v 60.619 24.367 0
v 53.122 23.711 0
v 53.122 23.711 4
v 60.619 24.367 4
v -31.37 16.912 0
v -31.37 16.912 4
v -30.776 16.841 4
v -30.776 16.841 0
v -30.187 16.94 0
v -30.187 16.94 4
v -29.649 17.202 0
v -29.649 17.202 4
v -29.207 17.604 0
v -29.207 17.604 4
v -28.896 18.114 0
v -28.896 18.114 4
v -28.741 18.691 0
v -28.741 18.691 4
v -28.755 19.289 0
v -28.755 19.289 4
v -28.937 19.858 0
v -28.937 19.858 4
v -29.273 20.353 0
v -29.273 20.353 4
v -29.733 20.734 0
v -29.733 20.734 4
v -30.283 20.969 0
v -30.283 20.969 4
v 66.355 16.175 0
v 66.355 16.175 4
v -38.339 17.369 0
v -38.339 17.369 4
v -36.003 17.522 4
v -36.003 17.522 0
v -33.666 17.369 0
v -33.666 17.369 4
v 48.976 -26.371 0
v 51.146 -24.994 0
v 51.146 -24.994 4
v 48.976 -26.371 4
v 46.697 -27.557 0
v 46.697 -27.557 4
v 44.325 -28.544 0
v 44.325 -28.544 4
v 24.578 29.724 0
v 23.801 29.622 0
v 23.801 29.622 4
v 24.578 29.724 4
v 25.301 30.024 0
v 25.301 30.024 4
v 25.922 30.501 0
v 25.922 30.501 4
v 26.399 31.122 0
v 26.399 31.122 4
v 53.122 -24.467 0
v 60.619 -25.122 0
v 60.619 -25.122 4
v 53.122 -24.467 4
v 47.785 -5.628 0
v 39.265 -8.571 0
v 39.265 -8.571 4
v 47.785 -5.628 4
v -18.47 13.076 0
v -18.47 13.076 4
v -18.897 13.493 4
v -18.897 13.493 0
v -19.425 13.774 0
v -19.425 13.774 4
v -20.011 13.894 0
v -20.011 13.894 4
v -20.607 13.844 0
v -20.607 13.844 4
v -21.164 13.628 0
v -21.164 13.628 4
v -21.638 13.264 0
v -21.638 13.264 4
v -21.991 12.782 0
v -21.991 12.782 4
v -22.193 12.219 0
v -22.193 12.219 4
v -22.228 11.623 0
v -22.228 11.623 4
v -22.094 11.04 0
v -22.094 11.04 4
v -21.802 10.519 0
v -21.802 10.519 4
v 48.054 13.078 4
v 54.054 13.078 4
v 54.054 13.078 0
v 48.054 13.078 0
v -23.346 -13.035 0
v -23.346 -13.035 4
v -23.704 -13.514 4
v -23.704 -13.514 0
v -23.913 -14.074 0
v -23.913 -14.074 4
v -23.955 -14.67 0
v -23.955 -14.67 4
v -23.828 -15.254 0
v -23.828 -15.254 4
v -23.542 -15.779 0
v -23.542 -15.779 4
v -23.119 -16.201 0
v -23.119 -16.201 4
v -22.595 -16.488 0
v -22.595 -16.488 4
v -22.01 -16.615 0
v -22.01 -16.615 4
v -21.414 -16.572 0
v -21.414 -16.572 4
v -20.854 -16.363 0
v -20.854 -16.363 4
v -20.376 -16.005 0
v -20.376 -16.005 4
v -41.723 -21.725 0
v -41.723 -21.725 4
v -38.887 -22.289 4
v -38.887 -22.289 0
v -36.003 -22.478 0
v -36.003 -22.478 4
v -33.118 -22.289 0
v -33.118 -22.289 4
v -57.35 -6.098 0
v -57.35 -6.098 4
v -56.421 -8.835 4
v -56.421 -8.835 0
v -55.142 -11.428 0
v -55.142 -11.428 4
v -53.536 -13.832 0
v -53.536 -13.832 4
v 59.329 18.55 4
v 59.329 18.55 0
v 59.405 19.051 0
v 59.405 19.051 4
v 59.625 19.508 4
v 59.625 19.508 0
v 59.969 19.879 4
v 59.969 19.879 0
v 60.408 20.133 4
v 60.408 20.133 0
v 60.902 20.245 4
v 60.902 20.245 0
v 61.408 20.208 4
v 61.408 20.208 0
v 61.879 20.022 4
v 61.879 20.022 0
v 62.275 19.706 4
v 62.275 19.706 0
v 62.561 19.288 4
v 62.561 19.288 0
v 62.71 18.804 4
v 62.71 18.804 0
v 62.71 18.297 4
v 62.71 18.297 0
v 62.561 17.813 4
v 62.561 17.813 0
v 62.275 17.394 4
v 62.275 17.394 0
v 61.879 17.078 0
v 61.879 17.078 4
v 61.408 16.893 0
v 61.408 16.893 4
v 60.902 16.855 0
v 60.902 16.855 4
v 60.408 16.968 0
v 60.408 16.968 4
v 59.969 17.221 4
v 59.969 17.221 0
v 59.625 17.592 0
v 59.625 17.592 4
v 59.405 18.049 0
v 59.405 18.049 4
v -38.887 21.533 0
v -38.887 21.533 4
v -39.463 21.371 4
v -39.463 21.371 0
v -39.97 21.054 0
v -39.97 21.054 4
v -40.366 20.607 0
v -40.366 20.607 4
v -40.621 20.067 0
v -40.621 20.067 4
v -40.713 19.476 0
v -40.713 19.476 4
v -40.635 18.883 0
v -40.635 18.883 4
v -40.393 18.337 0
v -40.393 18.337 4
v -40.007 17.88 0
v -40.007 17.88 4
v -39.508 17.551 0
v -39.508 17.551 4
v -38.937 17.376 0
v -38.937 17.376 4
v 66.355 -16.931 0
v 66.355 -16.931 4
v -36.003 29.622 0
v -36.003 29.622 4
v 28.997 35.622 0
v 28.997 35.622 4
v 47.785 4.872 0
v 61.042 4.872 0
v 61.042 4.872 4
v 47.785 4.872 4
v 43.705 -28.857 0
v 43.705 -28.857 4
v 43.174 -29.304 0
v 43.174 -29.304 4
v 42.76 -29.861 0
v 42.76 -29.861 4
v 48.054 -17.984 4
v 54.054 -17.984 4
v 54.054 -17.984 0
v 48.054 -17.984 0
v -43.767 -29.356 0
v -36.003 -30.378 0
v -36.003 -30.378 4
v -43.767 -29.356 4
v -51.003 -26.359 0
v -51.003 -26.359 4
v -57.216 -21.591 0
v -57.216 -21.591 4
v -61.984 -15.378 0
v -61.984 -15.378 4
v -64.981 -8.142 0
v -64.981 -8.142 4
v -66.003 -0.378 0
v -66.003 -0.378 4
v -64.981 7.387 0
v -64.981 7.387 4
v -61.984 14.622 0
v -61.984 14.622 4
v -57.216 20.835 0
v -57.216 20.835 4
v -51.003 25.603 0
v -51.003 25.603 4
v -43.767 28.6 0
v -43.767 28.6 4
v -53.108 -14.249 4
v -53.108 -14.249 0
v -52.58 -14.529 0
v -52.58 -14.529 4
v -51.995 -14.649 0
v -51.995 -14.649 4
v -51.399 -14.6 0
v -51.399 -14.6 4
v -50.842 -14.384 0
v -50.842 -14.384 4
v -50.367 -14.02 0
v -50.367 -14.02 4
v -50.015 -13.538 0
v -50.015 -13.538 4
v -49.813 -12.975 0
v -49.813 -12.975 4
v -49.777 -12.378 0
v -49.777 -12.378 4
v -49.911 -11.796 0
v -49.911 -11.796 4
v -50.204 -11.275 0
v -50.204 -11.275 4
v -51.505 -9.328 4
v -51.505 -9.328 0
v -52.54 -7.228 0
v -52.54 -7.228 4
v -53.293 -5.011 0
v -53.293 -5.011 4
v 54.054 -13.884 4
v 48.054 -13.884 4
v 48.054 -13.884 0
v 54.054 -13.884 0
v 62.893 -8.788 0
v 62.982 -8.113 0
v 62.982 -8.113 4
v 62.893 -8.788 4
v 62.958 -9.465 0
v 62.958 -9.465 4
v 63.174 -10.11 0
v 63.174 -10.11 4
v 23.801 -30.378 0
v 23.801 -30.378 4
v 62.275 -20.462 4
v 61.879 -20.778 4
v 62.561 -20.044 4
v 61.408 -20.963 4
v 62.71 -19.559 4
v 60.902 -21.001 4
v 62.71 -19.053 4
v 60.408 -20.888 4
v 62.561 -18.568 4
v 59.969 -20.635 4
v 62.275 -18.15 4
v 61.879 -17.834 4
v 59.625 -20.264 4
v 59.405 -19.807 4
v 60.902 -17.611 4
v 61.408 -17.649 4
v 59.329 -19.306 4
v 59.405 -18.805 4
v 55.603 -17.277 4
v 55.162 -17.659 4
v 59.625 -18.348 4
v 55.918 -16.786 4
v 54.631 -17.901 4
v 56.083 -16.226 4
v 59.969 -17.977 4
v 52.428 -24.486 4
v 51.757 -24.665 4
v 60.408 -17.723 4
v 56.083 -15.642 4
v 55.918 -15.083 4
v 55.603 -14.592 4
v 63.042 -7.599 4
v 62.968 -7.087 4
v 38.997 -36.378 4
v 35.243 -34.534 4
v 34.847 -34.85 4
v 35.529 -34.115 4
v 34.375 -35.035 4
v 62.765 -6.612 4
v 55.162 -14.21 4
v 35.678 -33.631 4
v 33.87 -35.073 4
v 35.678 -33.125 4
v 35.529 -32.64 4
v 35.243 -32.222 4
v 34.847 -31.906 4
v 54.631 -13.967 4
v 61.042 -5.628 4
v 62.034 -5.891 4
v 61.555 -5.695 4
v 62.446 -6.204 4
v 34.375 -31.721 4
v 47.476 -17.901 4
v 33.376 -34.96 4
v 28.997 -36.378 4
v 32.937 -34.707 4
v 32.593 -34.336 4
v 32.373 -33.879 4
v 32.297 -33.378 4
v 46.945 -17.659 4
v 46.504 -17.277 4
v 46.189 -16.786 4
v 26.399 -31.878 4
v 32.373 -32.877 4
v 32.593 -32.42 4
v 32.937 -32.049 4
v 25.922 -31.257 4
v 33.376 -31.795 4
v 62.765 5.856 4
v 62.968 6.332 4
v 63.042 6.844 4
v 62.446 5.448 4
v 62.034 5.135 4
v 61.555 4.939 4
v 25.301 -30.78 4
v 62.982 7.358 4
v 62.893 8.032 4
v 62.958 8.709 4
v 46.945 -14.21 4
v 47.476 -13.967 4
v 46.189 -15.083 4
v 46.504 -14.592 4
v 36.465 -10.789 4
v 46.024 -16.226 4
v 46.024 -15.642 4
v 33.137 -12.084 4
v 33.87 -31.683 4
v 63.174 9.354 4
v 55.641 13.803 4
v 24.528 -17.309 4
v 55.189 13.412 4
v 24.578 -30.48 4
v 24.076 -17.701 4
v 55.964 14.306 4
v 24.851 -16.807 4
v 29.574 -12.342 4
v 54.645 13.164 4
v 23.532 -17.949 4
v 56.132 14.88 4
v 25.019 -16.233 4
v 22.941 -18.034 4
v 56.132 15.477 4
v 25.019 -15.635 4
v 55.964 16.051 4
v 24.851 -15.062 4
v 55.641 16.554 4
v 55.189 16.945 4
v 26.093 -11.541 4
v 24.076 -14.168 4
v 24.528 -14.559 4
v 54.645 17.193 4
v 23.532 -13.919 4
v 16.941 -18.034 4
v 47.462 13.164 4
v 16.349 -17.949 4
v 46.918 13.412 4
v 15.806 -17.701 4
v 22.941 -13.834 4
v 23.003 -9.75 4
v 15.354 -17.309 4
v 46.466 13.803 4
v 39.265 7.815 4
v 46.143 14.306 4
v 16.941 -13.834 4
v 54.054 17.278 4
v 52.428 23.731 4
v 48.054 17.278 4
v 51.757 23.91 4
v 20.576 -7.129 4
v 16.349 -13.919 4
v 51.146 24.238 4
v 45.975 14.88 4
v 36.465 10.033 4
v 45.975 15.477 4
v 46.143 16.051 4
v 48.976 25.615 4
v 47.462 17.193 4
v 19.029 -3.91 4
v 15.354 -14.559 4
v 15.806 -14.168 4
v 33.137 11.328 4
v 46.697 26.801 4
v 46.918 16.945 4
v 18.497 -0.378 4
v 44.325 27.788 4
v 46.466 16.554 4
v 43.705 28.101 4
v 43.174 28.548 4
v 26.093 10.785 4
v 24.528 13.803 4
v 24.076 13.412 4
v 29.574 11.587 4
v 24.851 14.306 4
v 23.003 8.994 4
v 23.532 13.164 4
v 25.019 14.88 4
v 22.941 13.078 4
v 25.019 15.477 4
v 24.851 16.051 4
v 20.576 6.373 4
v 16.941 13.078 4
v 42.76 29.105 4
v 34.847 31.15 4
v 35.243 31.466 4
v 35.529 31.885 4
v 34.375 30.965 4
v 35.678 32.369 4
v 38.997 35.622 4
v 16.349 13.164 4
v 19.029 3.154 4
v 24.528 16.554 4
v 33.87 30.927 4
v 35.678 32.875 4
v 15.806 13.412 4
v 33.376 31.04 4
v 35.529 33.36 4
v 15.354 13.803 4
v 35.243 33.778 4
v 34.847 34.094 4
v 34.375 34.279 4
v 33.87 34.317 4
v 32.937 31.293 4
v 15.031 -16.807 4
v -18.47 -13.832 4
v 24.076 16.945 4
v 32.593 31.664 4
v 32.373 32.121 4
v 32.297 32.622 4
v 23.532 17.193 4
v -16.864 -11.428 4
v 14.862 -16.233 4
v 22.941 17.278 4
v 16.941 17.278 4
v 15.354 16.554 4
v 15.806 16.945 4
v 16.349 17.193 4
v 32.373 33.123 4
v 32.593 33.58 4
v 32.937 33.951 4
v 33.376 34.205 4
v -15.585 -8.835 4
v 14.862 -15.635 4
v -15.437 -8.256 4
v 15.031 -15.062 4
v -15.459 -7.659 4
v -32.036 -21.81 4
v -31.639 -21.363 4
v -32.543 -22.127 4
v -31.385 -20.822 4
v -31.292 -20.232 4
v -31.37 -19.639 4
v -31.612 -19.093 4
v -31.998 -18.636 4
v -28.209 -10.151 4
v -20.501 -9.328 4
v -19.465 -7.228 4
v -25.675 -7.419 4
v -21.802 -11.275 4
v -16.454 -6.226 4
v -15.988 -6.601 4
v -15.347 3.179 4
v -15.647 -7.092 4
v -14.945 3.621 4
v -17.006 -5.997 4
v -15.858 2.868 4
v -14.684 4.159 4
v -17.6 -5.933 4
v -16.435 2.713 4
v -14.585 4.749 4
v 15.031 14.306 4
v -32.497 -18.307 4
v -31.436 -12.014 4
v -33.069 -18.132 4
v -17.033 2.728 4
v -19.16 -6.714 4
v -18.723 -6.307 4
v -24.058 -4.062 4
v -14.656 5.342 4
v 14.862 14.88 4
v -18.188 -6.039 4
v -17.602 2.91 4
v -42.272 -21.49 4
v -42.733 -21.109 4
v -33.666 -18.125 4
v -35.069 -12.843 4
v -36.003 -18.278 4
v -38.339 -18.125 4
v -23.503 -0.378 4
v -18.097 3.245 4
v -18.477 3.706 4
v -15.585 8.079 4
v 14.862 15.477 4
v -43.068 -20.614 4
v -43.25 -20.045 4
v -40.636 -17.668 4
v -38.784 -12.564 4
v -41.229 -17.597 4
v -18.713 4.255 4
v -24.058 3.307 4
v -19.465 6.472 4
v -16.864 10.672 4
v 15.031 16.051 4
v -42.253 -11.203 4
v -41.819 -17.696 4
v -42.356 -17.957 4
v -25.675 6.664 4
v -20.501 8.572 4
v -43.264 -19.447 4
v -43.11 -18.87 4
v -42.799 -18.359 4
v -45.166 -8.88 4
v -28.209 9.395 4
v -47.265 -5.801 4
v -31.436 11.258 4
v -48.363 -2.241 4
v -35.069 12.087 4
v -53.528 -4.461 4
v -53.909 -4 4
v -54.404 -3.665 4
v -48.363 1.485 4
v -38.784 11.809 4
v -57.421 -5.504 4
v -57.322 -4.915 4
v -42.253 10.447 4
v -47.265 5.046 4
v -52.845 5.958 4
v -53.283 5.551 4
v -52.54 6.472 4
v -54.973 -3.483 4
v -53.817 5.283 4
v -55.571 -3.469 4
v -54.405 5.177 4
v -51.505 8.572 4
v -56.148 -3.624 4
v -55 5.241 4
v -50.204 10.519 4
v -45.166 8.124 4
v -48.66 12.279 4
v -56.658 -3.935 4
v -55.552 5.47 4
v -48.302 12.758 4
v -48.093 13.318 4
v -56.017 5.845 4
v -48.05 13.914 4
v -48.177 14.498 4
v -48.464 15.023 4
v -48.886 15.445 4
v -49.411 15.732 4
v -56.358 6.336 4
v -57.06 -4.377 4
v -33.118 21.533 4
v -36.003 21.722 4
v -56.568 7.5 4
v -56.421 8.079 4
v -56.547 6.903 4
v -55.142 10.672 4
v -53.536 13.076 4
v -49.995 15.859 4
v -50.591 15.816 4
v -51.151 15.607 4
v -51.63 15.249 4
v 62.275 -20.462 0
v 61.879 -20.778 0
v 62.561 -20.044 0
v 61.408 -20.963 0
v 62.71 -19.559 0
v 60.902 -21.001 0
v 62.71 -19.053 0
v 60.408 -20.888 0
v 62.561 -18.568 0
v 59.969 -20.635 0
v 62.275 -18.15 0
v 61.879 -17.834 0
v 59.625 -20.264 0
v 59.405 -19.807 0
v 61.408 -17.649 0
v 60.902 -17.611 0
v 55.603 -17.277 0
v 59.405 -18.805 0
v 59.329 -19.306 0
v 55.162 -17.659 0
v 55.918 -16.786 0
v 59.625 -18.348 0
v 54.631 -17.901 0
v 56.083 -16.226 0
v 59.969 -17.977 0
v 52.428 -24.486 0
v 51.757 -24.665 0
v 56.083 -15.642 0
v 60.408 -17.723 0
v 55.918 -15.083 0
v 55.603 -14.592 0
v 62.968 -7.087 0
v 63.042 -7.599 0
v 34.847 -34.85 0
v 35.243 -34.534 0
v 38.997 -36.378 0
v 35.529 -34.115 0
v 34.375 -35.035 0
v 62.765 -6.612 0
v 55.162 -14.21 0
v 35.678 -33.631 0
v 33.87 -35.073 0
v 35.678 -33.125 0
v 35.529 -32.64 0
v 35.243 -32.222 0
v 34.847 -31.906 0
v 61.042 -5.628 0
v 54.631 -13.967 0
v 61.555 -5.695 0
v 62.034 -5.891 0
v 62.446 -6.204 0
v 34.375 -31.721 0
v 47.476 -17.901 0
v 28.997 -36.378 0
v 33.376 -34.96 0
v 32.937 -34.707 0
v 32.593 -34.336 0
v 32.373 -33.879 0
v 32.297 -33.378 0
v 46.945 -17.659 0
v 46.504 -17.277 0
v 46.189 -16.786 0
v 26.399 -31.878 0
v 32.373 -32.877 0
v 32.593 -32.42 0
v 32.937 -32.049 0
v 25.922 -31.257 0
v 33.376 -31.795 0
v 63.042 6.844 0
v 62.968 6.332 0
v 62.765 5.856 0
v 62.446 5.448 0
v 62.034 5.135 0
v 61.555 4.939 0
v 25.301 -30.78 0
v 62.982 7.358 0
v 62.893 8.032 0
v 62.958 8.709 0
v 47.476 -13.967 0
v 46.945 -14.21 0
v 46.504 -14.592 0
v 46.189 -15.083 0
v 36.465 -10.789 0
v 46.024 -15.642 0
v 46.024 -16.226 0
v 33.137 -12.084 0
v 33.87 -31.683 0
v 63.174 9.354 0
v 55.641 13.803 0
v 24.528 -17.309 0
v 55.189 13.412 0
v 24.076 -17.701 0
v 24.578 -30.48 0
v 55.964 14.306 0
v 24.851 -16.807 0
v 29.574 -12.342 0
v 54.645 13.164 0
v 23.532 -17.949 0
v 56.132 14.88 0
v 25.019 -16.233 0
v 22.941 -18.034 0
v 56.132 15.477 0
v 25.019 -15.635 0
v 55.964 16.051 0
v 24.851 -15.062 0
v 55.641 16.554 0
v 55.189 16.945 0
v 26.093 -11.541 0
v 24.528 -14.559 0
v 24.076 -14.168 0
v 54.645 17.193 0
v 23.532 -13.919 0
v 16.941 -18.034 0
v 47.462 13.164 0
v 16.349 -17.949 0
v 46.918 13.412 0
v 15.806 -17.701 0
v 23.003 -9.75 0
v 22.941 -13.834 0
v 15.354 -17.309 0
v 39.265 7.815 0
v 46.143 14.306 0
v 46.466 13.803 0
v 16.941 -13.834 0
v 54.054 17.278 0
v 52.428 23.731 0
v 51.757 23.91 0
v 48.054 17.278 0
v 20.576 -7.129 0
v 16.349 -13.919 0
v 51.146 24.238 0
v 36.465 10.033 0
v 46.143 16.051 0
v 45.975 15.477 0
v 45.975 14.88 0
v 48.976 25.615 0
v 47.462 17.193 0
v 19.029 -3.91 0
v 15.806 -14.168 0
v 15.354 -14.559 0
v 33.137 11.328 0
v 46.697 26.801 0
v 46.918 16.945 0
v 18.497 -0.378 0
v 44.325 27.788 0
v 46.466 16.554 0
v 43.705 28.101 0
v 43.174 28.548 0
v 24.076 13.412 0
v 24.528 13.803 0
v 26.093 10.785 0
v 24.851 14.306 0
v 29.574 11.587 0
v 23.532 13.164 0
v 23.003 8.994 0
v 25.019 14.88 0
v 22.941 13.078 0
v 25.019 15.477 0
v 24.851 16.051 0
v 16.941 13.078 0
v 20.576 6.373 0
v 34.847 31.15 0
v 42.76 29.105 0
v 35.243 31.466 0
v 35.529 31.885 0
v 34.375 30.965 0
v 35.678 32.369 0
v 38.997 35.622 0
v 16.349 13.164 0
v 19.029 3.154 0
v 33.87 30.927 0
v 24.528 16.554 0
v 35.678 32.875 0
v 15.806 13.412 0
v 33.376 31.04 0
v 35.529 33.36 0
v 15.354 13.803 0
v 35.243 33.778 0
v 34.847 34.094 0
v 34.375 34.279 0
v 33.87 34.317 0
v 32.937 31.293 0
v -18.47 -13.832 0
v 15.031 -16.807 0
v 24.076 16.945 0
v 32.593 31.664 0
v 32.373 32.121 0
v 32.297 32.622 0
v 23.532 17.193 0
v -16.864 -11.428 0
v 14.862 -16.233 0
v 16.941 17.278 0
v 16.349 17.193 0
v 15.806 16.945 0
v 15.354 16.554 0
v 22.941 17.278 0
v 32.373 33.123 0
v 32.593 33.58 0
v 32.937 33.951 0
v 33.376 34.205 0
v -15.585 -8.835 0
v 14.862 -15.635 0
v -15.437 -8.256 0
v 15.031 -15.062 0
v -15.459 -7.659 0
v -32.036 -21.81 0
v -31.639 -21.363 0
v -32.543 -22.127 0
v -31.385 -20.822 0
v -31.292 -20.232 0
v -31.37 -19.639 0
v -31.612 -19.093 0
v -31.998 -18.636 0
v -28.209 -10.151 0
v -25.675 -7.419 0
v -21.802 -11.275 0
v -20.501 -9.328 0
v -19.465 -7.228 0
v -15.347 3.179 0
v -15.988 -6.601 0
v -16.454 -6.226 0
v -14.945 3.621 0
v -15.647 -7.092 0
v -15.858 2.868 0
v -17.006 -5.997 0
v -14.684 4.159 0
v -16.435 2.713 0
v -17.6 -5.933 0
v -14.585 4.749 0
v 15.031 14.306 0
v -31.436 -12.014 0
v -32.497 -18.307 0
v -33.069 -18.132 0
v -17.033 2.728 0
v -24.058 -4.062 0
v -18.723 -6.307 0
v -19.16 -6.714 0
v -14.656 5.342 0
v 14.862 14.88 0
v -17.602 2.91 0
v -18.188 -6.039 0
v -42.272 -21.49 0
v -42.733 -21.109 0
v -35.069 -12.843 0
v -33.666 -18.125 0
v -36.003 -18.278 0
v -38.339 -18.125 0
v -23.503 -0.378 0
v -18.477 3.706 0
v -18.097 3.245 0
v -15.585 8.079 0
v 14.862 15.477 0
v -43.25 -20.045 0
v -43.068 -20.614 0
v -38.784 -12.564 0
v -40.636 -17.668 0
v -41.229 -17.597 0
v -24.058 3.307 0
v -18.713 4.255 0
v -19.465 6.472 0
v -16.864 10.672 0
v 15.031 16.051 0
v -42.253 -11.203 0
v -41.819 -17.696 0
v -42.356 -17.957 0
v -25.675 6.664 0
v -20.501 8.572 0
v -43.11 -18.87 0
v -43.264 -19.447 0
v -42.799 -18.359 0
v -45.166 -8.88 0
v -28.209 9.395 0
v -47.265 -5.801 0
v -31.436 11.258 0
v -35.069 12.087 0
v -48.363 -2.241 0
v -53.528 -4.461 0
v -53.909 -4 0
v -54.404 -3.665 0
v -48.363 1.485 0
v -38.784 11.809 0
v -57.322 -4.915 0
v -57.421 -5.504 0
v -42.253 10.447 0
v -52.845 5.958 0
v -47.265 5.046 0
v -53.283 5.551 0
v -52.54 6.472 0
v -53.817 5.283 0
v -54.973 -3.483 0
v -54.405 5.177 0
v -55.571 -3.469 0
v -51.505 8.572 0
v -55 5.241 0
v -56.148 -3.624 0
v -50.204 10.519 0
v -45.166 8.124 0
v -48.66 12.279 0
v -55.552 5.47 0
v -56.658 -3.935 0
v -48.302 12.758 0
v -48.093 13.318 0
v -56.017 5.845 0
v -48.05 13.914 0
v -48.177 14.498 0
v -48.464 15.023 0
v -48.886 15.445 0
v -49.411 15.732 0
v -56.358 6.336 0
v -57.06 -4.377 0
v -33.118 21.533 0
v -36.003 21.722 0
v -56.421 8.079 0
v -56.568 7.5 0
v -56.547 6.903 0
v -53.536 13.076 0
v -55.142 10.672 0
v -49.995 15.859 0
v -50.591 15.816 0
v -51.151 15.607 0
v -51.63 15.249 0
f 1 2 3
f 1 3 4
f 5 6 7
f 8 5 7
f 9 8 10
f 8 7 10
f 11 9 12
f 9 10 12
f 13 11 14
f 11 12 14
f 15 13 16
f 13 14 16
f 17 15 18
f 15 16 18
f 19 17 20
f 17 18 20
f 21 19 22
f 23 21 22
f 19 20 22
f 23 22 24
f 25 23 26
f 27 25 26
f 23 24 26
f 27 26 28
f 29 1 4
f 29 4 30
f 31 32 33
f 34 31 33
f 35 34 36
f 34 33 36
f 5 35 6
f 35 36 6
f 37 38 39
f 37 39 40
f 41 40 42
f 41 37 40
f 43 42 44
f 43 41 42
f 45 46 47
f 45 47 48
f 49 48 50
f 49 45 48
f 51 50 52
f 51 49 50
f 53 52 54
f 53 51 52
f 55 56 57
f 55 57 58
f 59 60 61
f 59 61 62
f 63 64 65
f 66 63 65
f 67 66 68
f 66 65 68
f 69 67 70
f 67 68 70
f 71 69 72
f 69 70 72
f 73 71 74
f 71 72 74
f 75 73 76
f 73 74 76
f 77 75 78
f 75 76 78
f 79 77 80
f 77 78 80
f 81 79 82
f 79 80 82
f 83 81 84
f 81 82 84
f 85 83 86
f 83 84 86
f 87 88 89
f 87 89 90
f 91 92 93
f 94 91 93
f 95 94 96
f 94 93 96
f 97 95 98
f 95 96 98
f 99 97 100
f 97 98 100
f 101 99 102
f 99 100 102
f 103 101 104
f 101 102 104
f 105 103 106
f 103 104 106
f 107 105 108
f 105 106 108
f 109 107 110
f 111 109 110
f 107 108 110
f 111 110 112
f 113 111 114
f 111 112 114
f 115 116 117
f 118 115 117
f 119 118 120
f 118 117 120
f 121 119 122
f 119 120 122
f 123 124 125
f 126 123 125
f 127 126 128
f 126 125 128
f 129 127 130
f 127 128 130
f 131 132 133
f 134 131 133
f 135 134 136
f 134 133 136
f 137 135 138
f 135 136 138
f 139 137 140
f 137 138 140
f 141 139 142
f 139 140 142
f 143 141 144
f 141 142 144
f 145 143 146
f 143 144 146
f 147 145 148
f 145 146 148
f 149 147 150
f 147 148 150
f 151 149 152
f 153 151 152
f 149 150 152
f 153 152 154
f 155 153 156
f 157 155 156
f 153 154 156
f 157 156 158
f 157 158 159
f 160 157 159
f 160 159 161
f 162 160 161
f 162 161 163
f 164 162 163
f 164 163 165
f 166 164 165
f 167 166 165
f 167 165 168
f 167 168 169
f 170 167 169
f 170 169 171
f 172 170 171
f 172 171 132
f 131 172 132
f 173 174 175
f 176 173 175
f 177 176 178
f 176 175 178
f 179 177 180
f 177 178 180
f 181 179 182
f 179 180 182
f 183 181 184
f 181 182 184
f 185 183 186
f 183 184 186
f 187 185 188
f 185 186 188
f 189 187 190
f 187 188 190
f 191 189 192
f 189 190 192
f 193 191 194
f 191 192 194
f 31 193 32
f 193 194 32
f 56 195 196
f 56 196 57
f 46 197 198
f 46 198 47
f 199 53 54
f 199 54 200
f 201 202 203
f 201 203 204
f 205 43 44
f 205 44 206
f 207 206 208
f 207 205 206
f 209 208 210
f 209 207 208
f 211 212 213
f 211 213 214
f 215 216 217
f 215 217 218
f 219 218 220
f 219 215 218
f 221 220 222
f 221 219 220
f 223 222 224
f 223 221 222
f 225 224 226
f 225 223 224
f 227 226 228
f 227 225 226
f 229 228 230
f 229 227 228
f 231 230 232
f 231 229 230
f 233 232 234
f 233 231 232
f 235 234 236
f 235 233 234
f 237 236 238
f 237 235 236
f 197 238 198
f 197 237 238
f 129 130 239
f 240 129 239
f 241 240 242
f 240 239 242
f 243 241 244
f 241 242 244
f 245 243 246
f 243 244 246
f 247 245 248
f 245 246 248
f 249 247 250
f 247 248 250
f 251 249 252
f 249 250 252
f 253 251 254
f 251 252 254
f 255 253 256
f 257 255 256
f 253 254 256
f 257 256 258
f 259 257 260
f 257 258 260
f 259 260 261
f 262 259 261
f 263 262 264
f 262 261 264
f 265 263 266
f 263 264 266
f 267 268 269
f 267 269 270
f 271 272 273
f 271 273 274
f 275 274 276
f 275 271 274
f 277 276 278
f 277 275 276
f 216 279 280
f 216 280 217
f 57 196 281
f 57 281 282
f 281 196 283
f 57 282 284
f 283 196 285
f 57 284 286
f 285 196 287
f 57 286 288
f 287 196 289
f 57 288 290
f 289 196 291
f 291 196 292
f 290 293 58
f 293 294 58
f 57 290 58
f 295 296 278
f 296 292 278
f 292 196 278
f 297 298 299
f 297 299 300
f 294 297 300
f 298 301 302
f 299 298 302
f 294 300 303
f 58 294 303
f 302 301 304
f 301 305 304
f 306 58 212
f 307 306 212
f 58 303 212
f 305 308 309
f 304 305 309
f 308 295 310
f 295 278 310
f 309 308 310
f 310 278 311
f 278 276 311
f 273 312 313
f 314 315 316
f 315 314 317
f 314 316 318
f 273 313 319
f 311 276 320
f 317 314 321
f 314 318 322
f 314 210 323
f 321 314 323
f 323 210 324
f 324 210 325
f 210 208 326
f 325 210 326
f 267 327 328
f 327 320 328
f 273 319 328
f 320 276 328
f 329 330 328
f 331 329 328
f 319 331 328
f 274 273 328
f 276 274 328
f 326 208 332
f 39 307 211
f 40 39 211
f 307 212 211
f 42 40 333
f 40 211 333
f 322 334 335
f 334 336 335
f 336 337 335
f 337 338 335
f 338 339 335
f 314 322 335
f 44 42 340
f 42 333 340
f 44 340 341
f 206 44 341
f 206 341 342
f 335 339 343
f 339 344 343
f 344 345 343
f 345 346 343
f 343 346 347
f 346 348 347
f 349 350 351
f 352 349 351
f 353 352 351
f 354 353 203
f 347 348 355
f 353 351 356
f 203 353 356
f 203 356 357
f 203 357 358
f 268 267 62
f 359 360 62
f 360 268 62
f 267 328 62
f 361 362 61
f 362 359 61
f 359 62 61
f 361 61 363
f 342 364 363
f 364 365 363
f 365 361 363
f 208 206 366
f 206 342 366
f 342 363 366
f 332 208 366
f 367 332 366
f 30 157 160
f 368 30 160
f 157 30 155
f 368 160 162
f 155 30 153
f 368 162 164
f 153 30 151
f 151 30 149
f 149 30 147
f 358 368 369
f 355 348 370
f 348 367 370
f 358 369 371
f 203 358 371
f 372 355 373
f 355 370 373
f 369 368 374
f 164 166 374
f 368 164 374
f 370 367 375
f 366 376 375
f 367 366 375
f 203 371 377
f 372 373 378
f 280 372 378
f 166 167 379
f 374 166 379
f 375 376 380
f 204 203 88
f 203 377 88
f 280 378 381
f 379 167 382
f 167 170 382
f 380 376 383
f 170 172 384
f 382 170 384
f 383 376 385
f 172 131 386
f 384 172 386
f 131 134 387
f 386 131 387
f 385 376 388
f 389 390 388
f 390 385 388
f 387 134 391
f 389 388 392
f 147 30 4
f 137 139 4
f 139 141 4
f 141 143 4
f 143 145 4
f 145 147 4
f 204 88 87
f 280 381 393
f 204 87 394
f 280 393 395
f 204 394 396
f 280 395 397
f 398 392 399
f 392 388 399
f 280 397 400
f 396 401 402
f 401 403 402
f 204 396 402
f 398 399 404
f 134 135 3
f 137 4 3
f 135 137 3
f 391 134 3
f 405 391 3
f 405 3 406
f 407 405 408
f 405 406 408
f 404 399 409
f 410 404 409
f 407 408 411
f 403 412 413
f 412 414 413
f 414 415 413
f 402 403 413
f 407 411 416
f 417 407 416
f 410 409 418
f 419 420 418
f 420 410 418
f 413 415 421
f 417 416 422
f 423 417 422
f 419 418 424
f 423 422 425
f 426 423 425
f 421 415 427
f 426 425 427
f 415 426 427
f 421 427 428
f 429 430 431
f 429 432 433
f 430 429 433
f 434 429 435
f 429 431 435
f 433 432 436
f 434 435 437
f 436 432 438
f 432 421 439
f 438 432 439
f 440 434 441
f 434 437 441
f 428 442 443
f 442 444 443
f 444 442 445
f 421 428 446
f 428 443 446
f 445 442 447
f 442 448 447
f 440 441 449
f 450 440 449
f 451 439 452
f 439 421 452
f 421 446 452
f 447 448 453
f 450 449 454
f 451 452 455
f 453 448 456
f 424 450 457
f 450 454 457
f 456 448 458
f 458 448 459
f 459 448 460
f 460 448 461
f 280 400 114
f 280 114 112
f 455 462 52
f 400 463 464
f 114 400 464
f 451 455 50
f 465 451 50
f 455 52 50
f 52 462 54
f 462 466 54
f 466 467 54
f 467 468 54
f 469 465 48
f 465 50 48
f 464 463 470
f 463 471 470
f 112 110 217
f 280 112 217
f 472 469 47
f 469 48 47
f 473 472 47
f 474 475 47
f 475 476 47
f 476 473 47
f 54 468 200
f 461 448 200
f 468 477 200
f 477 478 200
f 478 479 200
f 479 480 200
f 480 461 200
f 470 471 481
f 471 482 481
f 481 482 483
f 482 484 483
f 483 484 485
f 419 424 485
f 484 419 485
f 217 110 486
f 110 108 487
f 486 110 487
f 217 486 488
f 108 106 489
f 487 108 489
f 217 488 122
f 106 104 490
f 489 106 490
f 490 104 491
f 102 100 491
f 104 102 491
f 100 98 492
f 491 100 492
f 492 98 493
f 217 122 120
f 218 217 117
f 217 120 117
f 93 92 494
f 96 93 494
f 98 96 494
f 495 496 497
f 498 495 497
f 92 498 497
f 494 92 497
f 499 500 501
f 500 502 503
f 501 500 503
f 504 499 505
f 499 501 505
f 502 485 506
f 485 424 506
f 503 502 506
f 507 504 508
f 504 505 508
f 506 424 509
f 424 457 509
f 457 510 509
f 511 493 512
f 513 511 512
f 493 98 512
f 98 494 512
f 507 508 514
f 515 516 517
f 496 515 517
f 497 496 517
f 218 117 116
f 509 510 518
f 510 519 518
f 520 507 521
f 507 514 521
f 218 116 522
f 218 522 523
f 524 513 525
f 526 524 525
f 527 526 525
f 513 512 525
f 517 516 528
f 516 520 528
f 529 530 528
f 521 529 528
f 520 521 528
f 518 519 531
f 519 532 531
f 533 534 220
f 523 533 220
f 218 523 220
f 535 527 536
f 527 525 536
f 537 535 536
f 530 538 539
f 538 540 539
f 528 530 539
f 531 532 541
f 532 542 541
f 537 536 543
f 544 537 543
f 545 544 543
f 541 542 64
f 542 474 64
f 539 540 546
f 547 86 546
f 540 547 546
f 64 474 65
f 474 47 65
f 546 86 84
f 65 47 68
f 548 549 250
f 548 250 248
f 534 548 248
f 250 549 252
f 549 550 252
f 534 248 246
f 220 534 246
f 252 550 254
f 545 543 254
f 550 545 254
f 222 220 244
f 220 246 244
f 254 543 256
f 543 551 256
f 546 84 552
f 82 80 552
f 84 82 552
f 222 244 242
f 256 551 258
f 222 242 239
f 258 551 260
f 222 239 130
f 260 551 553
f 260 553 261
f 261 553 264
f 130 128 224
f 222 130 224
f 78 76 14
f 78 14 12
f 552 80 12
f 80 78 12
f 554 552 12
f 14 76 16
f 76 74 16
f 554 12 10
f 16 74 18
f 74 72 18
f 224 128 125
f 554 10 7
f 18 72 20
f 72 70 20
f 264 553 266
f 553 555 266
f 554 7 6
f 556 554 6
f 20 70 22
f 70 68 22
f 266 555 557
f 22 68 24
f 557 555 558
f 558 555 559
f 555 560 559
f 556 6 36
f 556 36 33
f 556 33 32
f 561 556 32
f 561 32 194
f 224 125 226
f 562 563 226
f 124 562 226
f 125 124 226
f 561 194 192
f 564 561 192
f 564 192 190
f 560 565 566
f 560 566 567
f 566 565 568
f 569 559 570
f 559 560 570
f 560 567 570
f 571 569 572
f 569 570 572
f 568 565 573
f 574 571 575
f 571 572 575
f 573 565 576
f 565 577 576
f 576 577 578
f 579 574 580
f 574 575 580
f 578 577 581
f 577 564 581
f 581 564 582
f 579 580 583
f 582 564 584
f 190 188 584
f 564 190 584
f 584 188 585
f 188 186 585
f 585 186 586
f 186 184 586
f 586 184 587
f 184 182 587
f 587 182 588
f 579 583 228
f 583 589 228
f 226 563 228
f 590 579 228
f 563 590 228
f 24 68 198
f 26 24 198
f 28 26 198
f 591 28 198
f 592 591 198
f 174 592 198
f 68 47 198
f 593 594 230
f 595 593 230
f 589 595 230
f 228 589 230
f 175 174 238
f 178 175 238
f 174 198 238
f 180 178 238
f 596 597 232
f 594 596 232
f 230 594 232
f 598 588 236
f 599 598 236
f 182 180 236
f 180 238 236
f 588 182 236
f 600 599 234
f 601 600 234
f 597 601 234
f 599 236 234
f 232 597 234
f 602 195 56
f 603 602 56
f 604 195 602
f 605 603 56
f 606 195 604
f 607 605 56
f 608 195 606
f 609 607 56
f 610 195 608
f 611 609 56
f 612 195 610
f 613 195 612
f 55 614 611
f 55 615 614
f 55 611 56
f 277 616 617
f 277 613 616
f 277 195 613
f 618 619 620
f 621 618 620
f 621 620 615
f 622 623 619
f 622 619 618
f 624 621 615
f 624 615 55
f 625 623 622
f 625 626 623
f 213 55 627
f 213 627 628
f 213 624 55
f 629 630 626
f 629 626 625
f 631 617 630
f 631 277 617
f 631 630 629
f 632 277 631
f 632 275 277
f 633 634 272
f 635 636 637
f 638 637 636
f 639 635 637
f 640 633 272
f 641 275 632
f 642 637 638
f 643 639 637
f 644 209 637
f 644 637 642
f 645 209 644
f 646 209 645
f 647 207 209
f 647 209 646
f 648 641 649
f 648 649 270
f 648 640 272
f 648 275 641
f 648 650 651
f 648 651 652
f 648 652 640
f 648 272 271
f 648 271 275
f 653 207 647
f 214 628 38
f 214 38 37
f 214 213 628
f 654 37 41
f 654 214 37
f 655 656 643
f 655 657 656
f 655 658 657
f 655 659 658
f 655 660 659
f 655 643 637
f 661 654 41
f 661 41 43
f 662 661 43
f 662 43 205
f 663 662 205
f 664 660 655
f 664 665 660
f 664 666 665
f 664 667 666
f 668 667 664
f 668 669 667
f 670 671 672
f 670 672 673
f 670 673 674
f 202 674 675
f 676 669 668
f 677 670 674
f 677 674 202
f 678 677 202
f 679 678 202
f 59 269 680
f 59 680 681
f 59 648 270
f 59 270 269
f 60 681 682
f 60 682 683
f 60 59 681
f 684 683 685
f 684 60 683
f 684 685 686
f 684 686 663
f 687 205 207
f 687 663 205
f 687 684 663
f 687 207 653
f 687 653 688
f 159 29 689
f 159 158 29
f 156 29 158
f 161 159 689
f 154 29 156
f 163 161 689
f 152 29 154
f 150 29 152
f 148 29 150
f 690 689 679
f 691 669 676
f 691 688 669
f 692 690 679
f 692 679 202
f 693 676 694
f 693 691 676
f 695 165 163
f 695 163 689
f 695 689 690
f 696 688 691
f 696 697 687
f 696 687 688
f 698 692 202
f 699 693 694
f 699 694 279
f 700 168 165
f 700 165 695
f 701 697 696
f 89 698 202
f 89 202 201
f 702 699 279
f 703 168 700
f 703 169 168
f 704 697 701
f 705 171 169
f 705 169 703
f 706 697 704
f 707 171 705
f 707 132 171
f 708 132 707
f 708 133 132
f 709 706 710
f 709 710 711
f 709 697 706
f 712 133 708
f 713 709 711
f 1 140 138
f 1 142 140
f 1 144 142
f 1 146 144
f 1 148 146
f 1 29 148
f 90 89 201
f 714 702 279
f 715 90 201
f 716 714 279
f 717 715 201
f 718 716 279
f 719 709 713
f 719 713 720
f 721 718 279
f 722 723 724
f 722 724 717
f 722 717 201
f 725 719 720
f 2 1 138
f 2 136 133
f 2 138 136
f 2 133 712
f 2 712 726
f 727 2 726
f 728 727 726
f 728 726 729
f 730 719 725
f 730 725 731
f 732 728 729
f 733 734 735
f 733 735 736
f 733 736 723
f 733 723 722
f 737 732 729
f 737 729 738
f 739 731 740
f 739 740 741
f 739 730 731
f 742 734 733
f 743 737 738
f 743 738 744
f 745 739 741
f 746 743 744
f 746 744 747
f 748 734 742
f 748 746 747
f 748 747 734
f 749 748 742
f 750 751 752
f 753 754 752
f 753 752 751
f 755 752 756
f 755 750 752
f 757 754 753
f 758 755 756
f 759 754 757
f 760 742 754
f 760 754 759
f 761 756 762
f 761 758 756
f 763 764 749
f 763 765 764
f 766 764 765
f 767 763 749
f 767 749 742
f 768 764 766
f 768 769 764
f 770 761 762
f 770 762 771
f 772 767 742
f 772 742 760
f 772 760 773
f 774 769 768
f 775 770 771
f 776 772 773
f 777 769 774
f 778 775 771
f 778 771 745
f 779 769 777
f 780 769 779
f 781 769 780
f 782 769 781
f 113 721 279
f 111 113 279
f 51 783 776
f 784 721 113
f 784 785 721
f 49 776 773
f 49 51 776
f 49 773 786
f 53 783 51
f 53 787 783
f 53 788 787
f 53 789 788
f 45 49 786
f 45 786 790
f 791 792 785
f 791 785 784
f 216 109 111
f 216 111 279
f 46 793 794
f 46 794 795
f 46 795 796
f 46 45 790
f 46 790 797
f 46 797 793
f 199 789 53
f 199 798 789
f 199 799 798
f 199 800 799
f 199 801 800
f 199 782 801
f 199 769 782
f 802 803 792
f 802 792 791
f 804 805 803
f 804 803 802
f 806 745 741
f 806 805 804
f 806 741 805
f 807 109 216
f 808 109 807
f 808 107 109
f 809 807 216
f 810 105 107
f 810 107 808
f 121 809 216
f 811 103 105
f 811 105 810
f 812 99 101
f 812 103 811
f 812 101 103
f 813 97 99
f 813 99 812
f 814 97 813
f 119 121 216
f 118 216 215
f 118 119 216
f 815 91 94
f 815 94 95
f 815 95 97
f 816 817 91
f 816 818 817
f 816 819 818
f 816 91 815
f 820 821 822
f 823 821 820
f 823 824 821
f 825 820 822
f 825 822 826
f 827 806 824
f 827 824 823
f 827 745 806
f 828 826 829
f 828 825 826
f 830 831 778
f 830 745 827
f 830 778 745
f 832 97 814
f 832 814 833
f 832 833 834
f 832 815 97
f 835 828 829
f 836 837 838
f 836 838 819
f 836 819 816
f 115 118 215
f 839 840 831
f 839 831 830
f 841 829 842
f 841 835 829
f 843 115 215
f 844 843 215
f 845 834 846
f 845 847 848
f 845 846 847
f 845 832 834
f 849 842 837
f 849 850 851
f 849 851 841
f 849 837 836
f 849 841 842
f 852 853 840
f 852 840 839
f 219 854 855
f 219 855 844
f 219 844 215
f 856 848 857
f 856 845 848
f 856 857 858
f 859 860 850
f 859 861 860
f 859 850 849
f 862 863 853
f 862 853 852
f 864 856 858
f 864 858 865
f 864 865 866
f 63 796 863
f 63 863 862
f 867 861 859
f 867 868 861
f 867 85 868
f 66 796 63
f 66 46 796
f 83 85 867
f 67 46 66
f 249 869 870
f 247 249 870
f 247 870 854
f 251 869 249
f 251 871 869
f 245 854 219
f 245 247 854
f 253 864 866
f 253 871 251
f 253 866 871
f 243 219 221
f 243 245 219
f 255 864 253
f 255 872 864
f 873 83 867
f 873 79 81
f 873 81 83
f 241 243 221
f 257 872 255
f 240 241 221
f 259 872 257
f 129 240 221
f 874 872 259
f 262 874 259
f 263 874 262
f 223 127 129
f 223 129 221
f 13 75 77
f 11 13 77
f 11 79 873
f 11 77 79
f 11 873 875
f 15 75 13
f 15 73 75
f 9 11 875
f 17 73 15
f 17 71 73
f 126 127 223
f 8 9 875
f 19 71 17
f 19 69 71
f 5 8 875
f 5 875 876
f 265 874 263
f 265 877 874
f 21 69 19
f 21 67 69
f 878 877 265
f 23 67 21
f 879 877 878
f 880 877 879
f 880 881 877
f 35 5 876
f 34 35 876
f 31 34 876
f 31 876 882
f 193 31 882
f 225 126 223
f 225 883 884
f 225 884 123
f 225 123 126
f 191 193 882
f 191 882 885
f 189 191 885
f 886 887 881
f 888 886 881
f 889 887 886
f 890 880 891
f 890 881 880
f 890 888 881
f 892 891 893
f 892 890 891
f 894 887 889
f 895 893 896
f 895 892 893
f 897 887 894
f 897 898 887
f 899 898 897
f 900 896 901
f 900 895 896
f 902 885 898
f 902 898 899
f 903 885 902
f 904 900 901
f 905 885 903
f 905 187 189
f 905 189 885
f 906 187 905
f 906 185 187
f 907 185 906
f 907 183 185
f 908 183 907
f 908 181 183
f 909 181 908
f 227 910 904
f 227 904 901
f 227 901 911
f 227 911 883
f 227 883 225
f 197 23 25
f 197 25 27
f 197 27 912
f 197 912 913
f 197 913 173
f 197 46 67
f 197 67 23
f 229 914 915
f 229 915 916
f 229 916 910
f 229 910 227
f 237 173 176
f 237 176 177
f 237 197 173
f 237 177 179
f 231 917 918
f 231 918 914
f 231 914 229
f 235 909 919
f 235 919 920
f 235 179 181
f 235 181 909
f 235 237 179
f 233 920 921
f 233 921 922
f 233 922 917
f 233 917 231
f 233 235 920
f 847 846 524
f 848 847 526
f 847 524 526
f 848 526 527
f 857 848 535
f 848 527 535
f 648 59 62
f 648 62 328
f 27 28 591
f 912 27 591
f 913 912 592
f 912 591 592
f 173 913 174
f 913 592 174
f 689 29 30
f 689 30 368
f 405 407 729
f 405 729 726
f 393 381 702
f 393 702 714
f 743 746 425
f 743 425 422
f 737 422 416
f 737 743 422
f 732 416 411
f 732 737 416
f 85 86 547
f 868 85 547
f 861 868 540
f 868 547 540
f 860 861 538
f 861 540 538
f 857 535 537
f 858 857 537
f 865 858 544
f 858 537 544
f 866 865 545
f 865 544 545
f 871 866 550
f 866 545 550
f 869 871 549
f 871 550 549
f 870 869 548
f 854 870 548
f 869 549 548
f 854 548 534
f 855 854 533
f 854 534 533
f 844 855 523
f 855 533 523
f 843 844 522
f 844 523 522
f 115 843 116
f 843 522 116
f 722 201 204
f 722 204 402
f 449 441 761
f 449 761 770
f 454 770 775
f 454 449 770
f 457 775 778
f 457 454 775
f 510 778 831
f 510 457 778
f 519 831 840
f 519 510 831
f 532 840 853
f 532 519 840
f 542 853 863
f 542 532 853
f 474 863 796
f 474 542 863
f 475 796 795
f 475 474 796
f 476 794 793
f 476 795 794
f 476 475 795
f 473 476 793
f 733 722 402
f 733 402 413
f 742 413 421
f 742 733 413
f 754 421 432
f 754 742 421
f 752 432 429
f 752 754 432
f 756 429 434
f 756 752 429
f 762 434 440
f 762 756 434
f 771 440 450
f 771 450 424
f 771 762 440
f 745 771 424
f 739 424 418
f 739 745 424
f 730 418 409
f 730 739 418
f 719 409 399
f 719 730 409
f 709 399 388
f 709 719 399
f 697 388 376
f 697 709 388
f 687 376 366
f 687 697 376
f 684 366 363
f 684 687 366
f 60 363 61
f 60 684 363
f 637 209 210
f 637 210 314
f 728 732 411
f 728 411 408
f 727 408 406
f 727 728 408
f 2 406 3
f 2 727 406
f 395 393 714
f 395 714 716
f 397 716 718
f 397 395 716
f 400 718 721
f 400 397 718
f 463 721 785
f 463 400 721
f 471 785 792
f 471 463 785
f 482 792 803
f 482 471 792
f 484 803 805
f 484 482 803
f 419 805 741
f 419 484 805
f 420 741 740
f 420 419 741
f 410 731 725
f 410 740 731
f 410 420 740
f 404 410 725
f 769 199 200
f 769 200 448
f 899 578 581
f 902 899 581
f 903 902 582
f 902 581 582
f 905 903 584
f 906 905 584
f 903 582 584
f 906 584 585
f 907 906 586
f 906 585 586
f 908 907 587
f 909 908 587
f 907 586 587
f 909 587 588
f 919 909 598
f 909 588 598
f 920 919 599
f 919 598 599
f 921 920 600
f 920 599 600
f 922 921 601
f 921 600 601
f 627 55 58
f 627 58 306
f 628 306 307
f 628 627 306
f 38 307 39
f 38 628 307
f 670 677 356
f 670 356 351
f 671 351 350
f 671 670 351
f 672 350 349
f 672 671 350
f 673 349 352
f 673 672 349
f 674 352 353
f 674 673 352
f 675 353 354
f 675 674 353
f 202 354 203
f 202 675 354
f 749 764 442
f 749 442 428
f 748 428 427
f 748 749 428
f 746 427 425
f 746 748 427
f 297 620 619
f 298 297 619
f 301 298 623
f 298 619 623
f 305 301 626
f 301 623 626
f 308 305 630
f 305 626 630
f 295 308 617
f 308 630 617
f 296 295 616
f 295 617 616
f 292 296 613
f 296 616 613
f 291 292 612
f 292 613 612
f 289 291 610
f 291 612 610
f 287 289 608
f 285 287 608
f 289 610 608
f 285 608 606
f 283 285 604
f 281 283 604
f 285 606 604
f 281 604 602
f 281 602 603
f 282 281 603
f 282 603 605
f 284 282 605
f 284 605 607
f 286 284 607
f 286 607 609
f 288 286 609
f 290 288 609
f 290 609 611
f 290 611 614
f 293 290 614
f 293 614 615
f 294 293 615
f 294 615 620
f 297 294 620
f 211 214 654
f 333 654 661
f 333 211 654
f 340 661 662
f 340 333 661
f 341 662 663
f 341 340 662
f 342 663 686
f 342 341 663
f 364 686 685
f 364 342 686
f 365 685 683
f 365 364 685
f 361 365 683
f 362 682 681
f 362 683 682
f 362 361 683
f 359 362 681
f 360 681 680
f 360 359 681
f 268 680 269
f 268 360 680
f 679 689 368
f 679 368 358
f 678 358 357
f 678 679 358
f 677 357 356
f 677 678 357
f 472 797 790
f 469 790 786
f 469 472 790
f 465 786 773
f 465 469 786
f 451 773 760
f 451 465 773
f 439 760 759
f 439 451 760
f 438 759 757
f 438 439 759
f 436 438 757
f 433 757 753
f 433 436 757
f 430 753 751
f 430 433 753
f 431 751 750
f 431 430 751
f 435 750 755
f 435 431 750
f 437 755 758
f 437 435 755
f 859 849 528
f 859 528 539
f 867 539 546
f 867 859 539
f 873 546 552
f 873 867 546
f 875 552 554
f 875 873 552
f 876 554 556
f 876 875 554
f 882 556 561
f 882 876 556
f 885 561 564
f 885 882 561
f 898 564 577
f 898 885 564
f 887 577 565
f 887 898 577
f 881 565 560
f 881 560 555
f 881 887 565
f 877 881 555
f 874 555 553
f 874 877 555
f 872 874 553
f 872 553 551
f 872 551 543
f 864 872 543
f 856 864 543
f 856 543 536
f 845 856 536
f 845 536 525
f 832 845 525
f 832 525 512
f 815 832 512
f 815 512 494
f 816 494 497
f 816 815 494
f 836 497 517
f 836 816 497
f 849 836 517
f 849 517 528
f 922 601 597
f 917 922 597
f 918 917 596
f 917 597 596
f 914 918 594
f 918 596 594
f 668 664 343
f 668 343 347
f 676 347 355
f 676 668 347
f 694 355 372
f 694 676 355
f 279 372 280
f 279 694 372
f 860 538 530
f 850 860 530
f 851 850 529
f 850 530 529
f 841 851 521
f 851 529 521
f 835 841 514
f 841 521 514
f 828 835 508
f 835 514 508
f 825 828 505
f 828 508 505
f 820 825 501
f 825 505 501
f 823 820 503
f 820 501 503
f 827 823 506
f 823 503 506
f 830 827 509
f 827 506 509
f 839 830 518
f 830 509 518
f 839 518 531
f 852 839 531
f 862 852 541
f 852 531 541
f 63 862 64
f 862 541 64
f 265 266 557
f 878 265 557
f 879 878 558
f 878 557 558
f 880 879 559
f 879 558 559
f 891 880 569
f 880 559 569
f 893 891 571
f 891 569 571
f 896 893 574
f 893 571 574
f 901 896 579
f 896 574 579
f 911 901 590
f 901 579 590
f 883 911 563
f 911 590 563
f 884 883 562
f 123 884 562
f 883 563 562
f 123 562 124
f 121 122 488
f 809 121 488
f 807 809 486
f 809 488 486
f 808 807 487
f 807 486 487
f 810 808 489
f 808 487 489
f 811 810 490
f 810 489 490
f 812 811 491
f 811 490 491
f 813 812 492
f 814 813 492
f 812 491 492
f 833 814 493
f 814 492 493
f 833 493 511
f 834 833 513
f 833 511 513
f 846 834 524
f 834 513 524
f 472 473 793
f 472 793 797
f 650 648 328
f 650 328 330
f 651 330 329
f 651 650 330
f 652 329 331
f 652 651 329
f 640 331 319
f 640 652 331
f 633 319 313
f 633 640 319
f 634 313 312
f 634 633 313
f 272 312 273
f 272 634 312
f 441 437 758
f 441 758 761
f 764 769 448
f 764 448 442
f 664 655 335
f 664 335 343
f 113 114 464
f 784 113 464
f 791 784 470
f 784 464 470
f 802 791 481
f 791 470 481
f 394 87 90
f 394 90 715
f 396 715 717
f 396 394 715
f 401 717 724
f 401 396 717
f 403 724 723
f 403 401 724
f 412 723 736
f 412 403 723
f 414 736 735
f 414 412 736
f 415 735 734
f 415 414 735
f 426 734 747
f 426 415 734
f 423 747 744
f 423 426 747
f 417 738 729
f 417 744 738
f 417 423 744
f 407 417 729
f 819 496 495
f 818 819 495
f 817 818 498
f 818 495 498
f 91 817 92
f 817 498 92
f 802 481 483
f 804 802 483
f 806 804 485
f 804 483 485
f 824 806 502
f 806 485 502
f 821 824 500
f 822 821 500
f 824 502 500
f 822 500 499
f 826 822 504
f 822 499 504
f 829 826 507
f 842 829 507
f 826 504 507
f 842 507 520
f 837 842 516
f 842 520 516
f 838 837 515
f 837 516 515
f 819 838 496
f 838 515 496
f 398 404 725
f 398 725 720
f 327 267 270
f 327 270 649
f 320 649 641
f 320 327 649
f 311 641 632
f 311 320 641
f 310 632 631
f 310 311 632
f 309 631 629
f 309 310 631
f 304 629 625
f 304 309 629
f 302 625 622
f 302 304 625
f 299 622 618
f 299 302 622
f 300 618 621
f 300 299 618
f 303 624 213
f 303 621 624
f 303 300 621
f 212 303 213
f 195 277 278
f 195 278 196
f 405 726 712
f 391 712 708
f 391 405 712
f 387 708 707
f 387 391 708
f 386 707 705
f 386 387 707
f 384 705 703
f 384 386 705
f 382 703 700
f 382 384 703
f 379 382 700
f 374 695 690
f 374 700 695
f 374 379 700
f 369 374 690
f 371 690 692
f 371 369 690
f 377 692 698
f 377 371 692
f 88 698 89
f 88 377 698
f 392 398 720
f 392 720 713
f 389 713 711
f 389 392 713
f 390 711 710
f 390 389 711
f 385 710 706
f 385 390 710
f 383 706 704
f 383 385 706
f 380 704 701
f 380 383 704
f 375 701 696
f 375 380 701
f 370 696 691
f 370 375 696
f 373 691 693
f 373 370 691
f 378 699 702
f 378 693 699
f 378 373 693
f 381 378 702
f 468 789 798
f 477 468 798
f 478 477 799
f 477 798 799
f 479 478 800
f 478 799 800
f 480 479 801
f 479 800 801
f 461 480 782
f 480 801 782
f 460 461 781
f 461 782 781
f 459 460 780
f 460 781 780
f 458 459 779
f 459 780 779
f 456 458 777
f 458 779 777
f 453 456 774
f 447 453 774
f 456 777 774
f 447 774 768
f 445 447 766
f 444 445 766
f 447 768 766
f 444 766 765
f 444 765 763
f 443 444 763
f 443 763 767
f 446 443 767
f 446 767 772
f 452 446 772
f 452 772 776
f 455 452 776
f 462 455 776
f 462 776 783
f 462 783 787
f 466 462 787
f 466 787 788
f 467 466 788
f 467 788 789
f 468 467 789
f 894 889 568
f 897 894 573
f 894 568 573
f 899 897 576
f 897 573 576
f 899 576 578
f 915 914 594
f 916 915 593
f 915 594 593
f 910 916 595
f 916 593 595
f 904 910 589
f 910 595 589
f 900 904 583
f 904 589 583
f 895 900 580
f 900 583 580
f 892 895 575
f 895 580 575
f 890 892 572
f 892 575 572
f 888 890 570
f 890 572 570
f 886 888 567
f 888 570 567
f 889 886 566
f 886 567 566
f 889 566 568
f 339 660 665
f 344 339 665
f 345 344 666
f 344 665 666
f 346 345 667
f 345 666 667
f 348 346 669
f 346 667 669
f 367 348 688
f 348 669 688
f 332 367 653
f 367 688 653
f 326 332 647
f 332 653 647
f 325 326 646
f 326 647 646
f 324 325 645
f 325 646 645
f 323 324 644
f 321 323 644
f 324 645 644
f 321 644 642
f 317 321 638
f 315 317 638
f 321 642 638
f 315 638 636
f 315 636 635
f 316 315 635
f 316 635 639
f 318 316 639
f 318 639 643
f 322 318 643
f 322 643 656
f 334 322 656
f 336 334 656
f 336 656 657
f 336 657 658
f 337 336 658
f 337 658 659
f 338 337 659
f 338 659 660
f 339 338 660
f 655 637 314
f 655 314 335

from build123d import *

# Parameters (mm, degrees)
SKIZZE1_R                       = 12.5
AUFSATZ_LINEAR_AUSTRAGEN1_DEPTH = 4
DURCHGANGSLOCH_F_R_M31_D        = 3.4
SCHNITT_LINEAR_AUSTRAGEN1_DEPTH = 5
SCHNITT_LINEAR_AUSTRAGEN2_DEPTH = 5


with BuildPart() as part:
    # Skizze1 → Aufsatz-Linear austragen1 (new body)
    with BuildSketch(Plane.XY):
        with BuildLine():
            Line((60.618791136, -25.122399911), (53.121982765, -24.466514166))
            ThreePointArc((53.121982765, -24.466514166), (52.087524265, -24.556394327), (51.145668645, -24.99353369))
            ThreePointArc((51.145668645, -24.99353369), (47.84965812, -26.988212977), (44.325198534, -28.544045699))
            ThreePointArc((44.325198534, -28.544045699), (43.426888741, -29.064835818), (42.759922204, -29.860661471))
            Line((42.759922204, -29.860661471), (38.997199723, -36.377887981))
            Line((38.997199723, -36.377887981), (28.997199723, -36.377887981))
            Line((28.997199723, -36.377887981), (26.399123512, -31.877887981))
            ThreePointArc((26.399123512, -31.877887981), (25.301047301, -30.77981177), (23.801047301, -30.377887981))
            Line((23.801047301, -30.377887981), (-36.002800277, -30.377887981))
            ThreePointArc((-36.002800277, -30.377887981), (-66.002800277, -0.377887981), (-36.002800277, 29.622112019))
            Line((-36.002800277, 29.622112019), (23.801047301, 29.622112019))
            ThreePointArc((23.801047301, 29.622112019), (25.301047301, 30.024035807), (26.399123512, 31.122112019))
            Line((26.399123512, 31.122112019), (28.997199723, 35.622112019))
            Line((28.997199723, 35.622112019), (38.997199723, 35.622112019))
            Line((38.997199723, 35.622112019), (42.759922204, 29.104885508))
            ThreePointArc((42.759922204, 29.104885508), (43.426888741, 28.309059855), (44.325198534, 27.788269736))
            ThreePointArc((44.325198534, 27.788269736), (47.84965812, 26.232437014), (51.145668645, 24.237757727))
            ThreePointArc((51.145668645, 24.237757727), (52.087524265, 23.800618365), (53.121982765, 23.710738204))
            Line((53.121982765, 23.710738204), (60.618791136, 24.366623949))
            Line((60.618791136, 24.366623949), (66.3545555, 16.175103506))
            Line((66.3545555, 16.175103506), (63.173776116, 9.353900106))
            ThreePointArc((63.173776116, 9.353900106), (62.906383033, 8.372251699), (62.982460357, 7.357685339))
            ThreePointArc((62.982460357, 7.357685339), (62.618871056, 5.641491574), (61.042300943, 4.872112019))
            Line((61.042300943, 4.872112019), (47.785287356, 4.872112019))
            Line((47.785287356, 4.872112019), (39.265024534, 7.815111963))
            ThreePointArc((39.265024534, 7.815111963), (18.497199723, -0.377887981), (39.265024534, -8.570887926))
            Line((39.265024534, -8.570887926), (47.785287356, -5.627887981))
            Line((47.785287356, -5.627887981), (61.042300943, -5.627887981))
            ThreePointArc((61.042300943, -5.627887981), (62.618871056, -6.397267536), (62.982460357, -8.113461302))
            ThreePointArc((62.982460357, -8.113461302), (62.906383033, -9.128027661), (63.173776116, -10.109676068))
            Line((63.173776116, -10.109676068), (66.3545555, -16.930879469))
            Line((66.3545555, -16.930879469), (60.618791136, -25.122399911))
        make_face()
        with Locations((-36.002800277, -0.377887981)):
            Circle(SKIZZE1_R, mode=Mode.SUBTRACT)
    extrude(amount=AUFSATZ_LINEAR_AUSTRAGEN1_DEPTH)

    # Durchgangsloch für M31 (through all)
    with Locations(Plane.XY.offset(4)):
        with Locations((33.997199723, 32.622112019), (61.029217185, 18.550134418), (61.029217185, -19.305910381), (33.997199723, -33.377887981)):
            Hole(DURCHGANGSLOCH_F_R_M31_D / 2)

    # Skizze6 → Schnitt-Linear austragen1 (cut, through all)
    with BuildSketch(Plane.XY.offset(4)):
        with BuildLine():
            ThreePointArc((-30.28289938, 20.96907278), (-34.557391121, 21.674794222), (-38.887429125, 21.533043455))
            ThreePointArc((-38.887429125, 21.533043455), (-40.69535833, 19.176904242), (-38.339219117, 17.368975037))
            ThreePointArc((-38.339219117, 17.368975037), (-34.832084263, 17.483786745), (-31.369939369, 16.912184309))
            ThreePointArc((-31.369939369, 16.912184309), (-28.797975139, 18.39710855), (-30.28289938, 20.96907278))
        make_face()
        with BuildLine():
            ThreePointArc((-14.655839516, 5.342012915), (-16.181912689, 9.396692073), (-18.469691456, 13.0757396))
            ThreePointArc((-18.469691456, 13.0757396), (-21.414132472, 13.463382613), (-21.801775485, 10.518941598))
            ThreePointArc((-21.801775485, 10.518941598), (-19.948778203, 7.539079574), (-18.712727986, 4.254972926))
            ThreePointArc((-18.712727986, 4.254972926), (-16.140763756, 2.770048686), (-14.655839516, 5.342012915))
        make_face()
        with BuildLine():
            ThreePointArc((-20.375740412, -16.004947846), (-17.627321845, -12.655990131), (-15.585062608, -8.835191837))
            ThreePointArc((-15.585062608, -8.835191837), (-16.721574418, -6.09140961), (-19.465356645, -7.227921421))
            ThreePointArc((-19.465356645, -7.227921421), (-21.119494216, -10.322595152), (-23.345588893, -13.035099365))
            ThreePointArc((-23.345588893, -13.035099365), (-23.345588893, -16.004947846), (-20.375740412, -16.004947846))
        make_face()
        with BuildLine():
            ThreePointArc((-41.722701173, -21.724848742), (-37.448209433, -22.430570185), (-33.118171429, -22.288819418))
            ThreePointArc((-33.118171429, -22.288819418), (-31.310242223, -19.932680205), (-33.666381436, -18.124751))
            ThreePointArc((-33.666381436, -18.124751), (-37.17351629, -18.239562707), (-40.635661184, -17.667960272))
            ThreePointArc((-40.635661184, -17.667960272), (-43.207625414, -19.152884512), (-41.722701173, -21.724848742))
        make_face()
        with BuildLine():
            ThreePointArc((-57.349761038, -6.097788878), (-55.823687864, -10.152468035), (-53.535909097, -13.831515562))
            ThreePointArc((-53.535909097, -13.831515562), (-50.591468081, -14.219158576), (-50.203825068, -11.274717561))
            ThreePointArc((-50.203825068, -11.274717561), (-52.05682235, -8.294855536), (-53.292872567, -5.010748889))
            ThreePointArc((-53.292872567, -5.010748889), (-55.864836797, -3.525824648), (-57.349761038, -6.097788878))
        make_face()
        with BuildLine():
            ThreePointArc((-51.629860141, 15.249171883), (-54.378278708, 11.900214168), (-56.420537945, 8.079415874))
            ThreePointArc((-56.420537945, 8.079415874), (-55.284026135, 5.335633648), (-52.540243909, 6.472145458))
            ThreePointArc((-52.540243909, 6.472145458), (-50.886106337, 9.56681919), (-48.66001166, 12.279323402))
            ThreePointArc((-48.66001166, 12.279323402), (-48.66001166, 15.249171883), (-51.629860141, 15.249171883))
        make_face()
    extrude(amount=-SCHNITT_LINEAR_AUSTRAGEN1_DEPTH, mode=Mode.SUBTRACT)

    # Skizze7 → Schnitt-Linear austragen2 (cut, through all)
    with BuildSketch(Plane.XY.offset(4)):
        with BuildLine():
            Line((16.940850537, 17.278461205), (22.940850537, 17.278461205))
            ThreePointArc((22.940850537, 17.278461205), (25.040850537, 15.178461205), (22.940850537, 13.078461205))
            Line((22.940850537, 13.078461205), (16.940850537, 13.078461205))
            ThreePointArc((16.940850537, 13.078461205), (14.840850537, 15.178461205), (16.940850537, 17.278461205))
        make_face()
        with BuildLine():
            Line((48.05354891, 17.278461205), (54.05354891, 17.278461205))
            ThreePointArc((54.05354891, 17.278461205), (56.15354891, 15.178461205), (54.05354891, 13.078461205))
            Line((54.05354891, 13.078461205), (48.05354891, 13.078461205))
            ThreePointArc((48.05354891, 13.078461205), (45.95354891, 15.178461205), (48.05354891, 17.278461205))
        make_face()
        with BuildLine():
            Line((54.05354891, -17.984237167), (48.05354891, -17.984237167))
            ThreePointArc((48.05354891, -17.984237167), (46.00354891, -15.934237167), (48.05354891, -13.884237167))
            Line((48.05354891, -13.884237167), (54.05354891, -13.884237167))
            ThreePointArc((54.05354891, -13.884237167), (56.10354891, -15.934237167), (54.05354891, -17.984237167))
        make_face()
        with BuildLine():
            Line((22.940850537, -18.034237167), (16.940850537, -18.034237167))
            ThreePointArc((16.940850537, -18.034237167), (14.840850537, -15.934237167), (16.940850537, -13.834237167))
            Line((16.940850537, -13.834237167), (22.940850537, -13.834237167))
            ThreePointArc((22.940850537, -13.834237167), (25.040850537, -15.934237167), (22.940850537, -18.034237167))
        make_face()
    extrude(amount=-SCHNITT_LINEAR_AUSTRAGEN2_DEPTH, mode=Mode.SUBTRACT)


solid = part.part
